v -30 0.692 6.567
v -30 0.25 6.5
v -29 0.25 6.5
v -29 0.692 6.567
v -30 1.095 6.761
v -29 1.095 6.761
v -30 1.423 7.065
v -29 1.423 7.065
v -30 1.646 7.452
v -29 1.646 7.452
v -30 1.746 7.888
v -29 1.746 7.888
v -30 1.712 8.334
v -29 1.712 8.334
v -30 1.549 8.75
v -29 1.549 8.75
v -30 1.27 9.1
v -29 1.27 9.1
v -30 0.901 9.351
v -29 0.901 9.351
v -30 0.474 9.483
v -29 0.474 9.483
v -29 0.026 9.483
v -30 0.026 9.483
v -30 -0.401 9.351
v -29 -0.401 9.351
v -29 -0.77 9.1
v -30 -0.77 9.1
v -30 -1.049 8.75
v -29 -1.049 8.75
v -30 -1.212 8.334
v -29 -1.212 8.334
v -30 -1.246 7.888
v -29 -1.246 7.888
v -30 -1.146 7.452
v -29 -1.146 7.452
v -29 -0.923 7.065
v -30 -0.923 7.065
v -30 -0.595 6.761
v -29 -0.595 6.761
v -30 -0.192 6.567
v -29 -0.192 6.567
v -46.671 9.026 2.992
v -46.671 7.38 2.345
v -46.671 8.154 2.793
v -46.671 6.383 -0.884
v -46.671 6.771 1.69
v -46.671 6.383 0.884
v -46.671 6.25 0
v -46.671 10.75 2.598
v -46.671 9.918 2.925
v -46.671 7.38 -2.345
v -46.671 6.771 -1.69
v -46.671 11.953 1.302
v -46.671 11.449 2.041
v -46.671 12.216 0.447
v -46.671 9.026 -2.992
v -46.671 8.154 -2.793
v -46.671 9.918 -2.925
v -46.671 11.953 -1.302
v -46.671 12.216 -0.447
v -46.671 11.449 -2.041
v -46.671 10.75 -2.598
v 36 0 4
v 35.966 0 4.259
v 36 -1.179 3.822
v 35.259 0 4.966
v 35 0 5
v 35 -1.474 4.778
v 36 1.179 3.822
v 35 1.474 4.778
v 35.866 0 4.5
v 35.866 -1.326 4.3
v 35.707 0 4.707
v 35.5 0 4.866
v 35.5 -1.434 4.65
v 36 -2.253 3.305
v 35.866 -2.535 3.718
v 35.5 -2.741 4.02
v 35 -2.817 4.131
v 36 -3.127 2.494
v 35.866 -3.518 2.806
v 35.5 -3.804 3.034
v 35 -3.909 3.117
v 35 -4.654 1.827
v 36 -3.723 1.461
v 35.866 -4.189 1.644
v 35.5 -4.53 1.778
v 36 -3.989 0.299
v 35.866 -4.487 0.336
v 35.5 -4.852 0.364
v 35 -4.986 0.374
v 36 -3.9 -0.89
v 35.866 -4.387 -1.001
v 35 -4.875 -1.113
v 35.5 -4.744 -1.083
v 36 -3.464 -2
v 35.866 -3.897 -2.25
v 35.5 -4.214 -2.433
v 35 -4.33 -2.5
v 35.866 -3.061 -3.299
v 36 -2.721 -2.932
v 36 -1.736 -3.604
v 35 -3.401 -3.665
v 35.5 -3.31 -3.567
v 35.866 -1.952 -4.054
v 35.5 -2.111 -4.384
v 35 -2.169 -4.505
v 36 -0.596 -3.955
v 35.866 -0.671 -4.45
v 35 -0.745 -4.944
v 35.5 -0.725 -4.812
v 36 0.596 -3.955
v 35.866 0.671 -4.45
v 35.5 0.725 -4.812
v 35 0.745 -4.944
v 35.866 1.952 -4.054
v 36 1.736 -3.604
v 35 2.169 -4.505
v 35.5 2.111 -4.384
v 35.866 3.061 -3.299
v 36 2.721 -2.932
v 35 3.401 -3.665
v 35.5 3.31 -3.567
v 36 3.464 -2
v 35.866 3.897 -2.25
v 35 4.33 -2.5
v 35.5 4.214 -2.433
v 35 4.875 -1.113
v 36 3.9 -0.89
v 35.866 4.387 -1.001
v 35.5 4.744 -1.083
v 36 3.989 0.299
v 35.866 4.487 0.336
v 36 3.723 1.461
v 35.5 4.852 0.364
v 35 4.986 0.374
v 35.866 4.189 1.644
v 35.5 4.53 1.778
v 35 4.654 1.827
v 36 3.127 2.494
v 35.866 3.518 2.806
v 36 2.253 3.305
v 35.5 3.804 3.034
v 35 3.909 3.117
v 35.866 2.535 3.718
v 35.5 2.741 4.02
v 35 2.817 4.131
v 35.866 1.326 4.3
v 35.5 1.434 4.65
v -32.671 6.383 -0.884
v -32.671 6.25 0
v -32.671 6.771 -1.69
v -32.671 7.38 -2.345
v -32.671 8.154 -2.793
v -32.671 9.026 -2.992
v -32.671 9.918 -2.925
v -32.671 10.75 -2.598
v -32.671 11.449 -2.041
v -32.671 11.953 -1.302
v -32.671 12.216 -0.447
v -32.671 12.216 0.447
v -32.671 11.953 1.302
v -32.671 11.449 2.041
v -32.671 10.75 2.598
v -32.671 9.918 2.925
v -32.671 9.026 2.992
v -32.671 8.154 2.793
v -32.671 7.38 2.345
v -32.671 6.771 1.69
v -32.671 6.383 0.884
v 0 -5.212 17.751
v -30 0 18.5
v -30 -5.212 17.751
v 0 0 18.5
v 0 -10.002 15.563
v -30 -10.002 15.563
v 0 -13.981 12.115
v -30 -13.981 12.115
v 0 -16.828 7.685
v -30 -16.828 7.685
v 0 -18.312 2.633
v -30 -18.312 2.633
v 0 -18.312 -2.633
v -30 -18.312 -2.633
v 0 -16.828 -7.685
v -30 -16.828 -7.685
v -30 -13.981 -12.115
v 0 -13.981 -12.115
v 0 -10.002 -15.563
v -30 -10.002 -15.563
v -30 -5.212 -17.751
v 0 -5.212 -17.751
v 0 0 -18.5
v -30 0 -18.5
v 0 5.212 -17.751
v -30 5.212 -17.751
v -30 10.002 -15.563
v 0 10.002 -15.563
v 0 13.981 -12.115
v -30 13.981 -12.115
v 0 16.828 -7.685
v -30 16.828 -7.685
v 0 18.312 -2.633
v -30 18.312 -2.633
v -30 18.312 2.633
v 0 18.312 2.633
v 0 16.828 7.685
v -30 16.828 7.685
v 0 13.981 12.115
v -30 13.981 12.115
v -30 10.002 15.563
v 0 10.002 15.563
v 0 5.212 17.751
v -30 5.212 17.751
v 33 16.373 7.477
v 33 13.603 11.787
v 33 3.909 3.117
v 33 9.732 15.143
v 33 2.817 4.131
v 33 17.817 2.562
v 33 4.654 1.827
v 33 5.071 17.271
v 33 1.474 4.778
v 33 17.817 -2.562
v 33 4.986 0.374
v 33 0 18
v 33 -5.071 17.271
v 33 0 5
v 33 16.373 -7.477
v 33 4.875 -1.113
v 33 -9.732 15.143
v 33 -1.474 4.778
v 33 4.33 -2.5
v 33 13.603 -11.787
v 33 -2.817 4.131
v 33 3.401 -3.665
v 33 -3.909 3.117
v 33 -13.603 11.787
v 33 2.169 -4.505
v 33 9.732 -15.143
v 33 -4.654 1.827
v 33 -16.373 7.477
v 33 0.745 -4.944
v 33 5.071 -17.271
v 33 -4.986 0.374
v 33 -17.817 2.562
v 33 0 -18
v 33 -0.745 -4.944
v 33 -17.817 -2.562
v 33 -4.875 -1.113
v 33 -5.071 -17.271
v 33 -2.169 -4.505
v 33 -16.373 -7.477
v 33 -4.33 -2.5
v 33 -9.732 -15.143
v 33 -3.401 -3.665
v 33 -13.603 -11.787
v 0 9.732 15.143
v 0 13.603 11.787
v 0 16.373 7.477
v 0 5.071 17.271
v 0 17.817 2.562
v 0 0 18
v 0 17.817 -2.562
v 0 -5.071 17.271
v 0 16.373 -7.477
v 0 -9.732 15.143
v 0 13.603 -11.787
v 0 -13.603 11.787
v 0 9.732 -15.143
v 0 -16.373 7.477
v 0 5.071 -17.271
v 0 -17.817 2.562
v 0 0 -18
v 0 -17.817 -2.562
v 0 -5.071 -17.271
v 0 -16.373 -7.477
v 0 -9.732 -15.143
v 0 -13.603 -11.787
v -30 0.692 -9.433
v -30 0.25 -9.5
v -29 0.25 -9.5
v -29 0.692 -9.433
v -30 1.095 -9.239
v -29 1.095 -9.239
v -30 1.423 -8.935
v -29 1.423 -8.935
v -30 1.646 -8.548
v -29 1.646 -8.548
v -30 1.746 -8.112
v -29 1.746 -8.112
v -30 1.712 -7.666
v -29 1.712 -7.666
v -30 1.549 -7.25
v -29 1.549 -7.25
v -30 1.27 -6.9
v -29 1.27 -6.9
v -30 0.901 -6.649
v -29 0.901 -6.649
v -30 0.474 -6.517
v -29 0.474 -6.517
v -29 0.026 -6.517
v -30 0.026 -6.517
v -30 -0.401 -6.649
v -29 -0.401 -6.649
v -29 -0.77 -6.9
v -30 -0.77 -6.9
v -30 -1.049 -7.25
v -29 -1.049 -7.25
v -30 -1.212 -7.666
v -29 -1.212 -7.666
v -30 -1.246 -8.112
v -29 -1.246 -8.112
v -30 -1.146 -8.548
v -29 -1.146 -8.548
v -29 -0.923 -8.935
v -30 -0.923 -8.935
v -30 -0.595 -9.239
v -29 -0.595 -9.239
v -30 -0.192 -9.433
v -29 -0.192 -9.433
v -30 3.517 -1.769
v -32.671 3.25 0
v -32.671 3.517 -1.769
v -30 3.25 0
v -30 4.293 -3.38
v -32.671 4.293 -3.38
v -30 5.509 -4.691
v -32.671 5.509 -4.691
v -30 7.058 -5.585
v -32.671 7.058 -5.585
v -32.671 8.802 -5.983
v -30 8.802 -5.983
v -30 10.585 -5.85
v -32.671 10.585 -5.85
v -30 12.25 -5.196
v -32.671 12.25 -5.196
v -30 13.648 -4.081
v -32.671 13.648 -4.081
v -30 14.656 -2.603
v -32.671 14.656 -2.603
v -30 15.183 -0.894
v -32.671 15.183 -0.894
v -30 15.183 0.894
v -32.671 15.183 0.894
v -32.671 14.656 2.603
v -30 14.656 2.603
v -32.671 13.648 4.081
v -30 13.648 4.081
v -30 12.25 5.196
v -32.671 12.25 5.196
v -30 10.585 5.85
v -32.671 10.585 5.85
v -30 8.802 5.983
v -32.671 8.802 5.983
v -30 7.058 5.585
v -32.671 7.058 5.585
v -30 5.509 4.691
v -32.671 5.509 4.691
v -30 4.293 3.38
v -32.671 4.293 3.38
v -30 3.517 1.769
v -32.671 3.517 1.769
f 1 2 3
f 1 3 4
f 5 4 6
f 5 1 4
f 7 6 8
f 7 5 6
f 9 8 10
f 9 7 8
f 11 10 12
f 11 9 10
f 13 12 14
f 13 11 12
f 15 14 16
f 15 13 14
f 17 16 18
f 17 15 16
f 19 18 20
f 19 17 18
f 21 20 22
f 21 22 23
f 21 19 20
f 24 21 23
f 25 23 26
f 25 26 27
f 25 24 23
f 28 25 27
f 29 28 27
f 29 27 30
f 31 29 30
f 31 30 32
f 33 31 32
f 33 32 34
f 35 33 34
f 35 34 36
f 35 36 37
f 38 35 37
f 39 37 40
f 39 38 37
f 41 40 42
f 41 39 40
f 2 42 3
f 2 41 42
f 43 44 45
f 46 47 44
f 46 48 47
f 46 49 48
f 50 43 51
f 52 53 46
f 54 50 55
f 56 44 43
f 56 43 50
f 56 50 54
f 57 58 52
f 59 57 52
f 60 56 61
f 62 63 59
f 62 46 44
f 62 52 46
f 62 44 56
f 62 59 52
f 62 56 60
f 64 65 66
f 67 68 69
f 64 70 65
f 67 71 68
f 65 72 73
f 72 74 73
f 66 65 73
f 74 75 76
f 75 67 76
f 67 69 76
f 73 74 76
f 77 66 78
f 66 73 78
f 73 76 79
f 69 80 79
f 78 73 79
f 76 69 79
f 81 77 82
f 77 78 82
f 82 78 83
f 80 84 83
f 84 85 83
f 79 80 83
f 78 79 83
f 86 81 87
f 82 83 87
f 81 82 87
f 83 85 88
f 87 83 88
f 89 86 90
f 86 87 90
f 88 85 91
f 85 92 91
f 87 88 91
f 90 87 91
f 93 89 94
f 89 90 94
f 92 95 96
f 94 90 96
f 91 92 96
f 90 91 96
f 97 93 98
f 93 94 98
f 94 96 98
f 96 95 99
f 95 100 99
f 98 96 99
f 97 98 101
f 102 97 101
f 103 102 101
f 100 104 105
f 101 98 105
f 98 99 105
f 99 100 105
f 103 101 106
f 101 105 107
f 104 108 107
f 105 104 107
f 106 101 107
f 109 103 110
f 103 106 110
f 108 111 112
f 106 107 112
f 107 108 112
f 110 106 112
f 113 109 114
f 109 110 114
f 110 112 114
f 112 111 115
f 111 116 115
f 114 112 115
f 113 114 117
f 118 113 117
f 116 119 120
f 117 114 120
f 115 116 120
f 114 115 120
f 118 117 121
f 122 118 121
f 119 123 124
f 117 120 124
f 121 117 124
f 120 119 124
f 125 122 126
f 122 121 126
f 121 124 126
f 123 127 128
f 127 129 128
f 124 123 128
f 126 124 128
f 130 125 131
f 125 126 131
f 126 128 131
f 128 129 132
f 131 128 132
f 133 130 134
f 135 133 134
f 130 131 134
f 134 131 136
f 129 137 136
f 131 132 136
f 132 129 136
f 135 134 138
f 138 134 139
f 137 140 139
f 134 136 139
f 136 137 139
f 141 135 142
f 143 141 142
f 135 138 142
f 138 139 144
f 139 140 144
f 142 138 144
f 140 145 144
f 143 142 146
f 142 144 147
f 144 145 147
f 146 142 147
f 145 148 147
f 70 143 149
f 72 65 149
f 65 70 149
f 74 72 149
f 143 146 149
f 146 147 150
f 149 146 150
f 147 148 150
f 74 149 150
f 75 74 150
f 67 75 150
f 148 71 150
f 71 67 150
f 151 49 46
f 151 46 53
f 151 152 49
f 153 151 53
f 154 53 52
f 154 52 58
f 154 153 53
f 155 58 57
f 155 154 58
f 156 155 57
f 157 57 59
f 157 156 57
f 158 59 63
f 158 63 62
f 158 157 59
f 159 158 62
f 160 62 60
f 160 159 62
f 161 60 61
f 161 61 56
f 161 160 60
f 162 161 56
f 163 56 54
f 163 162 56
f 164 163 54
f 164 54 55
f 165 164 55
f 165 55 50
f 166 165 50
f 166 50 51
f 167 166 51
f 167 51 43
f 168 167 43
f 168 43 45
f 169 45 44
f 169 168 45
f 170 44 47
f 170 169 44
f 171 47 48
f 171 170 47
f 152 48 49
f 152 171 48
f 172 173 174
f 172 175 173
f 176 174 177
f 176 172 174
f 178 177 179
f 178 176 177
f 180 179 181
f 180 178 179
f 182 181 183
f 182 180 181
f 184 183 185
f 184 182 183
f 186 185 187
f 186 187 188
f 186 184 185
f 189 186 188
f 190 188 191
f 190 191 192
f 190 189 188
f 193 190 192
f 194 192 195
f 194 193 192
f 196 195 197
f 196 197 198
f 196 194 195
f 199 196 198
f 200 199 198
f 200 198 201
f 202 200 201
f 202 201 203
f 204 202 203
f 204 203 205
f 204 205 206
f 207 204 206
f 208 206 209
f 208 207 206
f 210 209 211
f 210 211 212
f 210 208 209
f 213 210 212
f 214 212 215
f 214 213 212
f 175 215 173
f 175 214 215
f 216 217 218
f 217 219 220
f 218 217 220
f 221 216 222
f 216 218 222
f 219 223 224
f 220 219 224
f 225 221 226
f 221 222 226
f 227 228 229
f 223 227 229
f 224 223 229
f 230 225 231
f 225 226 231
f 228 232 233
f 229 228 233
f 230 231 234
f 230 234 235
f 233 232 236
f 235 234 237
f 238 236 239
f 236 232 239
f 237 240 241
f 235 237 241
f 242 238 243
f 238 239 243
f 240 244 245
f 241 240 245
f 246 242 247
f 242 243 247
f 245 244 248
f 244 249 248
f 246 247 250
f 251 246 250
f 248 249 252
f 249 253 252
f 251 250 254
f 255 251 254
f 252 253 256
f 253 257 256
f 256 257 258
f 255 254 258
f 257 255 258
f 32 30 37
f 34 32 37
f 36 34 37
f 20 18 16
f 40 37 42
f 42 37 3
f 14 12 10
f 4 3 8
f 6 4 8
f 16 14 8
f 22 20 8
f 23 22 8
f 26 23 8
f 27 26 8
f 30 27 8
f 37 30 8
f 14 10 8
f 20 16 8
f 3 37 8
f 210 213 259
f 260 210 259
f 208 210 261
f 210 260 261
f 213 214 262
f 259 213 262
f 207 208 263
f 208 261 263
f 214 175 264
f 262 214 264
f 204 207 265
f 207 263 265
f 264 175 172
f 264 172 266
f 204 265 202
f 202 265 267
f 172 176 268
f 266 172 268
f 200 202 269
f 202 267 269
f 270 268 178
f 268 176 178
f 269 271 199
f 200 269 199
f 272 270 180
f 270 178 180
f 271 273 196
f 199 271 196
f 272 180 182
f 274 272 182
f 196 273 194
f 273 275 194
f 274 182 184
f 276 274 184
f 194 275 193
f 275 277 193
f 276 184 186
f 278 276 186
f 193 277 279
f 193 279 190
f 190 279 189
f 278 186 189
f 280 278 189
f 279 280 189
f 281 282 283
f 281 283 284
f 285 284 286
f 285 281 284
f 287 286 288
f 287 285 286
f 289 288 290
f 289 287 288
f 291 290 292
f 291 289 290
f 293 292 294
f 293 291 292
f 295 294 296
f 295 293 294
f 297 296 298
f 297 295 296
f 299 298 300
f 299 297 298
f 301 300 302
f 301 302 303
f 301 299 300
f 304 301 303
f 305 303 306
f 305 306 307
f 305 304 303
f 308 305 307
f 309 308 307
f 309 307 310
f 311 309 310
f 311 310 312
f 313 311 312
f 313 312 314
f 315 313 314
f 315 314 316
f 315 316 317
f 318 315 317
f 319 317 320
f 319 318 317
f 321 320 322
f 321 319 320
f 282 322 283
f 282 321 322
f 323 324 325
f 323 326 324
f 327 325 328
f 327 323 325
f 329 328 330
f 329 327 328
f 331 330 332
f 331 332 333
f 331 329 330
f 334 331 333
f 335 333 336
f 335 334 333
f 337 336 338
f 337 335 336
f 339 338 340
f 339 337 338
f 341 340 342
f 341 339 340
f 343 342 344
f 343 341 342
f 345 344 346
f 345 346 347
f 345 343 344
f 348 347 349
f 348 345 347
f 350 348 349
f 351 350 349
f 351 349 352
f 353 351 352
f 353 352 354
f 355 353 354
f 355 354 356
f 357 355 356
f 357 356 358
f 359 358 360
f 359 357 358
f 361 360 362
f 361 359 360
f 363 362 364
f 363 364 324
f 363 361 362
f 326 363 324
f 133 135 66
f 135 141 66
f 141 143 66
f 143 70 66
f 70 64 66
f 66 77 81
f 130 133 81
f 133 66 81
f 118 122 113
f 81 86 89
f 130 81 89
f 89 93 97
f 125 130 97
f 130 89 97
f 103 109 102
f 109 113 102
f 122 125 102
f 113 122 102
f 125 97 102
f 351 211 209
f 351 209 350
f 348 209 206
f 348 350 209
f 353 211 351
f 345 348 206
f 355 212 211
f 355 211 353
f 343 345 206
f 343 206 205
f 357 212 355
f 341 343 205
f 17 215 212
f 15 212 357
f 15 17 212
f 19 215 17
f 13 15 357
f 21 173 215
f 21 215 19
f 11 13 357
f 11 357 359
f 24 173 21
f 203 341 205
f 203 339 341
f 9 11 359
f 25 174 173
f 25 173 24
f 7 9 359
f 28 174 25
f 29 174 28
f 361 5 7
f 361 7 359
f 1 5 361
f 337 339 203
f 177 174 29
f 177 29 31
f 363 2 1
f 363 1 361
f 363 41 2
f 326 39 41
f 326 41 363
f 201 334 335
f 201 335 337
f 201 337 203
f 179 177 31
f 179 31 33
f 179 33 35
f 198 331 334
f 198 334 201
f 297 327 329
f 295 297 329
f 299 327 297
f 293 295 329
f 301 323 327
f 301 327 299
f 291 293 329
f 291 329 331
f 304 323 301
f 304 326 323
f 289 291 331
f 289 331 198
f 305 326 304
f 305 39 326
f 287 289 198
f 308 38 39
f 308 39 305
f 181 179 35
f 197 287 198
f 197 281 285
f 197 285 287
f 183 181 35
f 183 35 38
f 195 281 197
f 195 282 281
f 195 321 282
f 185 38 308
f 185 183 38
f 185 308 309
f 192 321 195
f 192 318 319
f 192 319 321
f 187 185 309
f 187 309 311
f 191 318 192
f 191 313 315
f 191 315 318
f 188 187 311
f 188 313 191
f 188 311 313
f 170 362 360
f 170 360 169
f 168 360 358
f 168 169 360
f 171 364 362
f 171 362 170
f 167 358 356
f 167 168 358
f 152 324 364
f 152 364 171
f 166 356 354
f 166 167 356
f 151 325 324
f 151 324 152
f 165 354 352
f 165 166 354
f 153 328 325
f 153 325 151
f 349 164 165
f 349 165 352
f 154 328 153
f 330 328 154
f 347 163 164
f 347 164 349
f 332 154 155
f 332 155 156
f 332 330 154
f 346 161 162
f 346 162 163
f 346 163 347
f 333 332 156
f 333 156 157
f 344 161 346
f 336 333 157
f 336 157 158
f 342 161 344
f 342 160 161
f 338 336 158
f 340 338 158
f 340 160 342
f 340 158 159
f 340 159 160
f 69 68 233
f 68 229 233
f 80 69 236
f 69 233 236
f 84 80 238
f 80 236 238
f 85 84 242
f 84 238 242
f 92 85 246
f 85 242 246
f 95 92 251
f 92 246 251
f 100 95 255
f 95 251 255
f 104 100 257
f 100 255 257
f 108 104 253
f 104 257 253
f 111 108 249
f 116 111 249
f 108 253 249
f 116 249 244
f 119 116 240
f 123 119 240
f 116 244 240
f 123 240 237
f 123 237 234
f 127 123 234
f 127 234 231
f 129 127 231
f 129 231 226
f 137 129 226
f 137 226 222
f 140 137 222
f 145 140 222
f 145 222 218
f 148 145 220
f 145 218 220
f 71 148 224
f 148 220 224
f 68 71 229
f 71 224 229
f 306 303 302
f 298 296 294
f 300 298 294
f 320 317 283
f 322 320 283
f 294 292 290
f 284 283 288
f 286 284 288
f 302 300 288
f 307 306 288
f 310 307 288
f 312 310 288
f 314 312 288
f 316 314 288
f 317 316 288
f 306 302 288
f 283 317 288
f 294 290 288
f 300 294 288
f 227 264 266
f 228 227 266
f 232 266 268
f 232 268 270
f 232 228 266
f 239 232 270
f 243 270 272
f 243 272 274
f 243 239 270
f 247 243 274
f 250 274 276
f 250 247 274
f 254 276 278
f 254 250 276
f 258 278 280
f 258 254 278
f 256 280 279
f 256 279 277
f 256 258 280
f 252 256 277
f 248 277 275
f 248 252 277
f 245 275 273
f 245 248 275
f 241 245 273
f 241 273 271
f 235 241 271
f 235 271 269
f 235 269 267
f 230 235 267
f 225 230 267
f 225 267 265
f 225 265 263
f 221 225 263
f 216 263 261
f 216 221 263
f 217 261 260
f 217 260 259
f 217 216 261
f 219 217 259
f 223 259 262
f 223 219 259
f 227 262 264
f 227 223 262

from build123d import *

# Parameters (mm, degrees)
SKETCH_1_W          = 33
SKETCH_1_H          = 18
SKETCH_2_W          = 14
SKETCH_2_H          = 3
SKETCH_2_W_2        = 2.671402587
SKETCH_2_H_2        = 6
CUT_EXTRUDE_START   = -30
SKETCH_4_R          = 1.5
CUT_EXTRUDE_1_DEPTH = 1


with BuildPart() as part:
    # 草图1 → 旋转1 (revolve)
    with BuildSketch(Plane.XY, mode=Mode.PRIVATE) as revolve_1_sk:
        Polygon((0, 18.5), (0, 18), (0, 0), (-30, 0), (-30, 18.5), align=None)
        with Locations((16.5, 9)):
            Rectangle(SKETCH_1_W, SKETCH_1_H)
        with BuildLine():
            Line((33, 5), (33, 0))
            Line((33, 0), (36, 0))
            Line((36, 0), (36, 4))
            ThreePointArc((36, 4), (35.707106781, 4.707106781), (35, 5))
            Line((35, 5), (33, 5))
        make_face()
    revolve(revolve_1_sk.sketch.rotate(Axis((-39.714285714, 0, 0), (1, 0, 0)), 90), axis=Axis((-39.714285714, 0, 0), (1, 0, 0)))

    # 草图2 → 旋转3 (revolve)
    with BuildSketch(Plane.XY, mode=Mode.PRIVATE) as revolve_3_sk:
        with Locations((-39.671402587, 10.75)):
            Rectangle(SKETCH_2_W, SKETCH_2_H)
        with Locations((-31.335701294, 12.25)):
            Rectangle(SKETCH_2_W_2, SKETCH_2_H_2)
    revolve(revolve_3_sk.sketch.rotate(Axis((-54.775263054, 9.25, 0), (1, 0, 0)), 180), axis=Axis((-54.775263054, 9.25, 0), (1, 0, 0)))

    # 草图4 → 切除-拉伸1 (cut)
    with BuildSketch(Plane(origin=(0, 0, 0), x_dir=(0, 0, -1), z_dir=(1, 0, 0)).offset(CUT_EXTRUDE_START)):
        with Locations((8, 0.25)):
            Circle(SKETCH_4_R)
        with Locations((-8, 0.25)):
            Circle(SKETCH_4_R)
    extrude(amount=CUT_EXTRUDE_1_DEPTH, mode=Mode.SUBTRACT)


solid = part.part
